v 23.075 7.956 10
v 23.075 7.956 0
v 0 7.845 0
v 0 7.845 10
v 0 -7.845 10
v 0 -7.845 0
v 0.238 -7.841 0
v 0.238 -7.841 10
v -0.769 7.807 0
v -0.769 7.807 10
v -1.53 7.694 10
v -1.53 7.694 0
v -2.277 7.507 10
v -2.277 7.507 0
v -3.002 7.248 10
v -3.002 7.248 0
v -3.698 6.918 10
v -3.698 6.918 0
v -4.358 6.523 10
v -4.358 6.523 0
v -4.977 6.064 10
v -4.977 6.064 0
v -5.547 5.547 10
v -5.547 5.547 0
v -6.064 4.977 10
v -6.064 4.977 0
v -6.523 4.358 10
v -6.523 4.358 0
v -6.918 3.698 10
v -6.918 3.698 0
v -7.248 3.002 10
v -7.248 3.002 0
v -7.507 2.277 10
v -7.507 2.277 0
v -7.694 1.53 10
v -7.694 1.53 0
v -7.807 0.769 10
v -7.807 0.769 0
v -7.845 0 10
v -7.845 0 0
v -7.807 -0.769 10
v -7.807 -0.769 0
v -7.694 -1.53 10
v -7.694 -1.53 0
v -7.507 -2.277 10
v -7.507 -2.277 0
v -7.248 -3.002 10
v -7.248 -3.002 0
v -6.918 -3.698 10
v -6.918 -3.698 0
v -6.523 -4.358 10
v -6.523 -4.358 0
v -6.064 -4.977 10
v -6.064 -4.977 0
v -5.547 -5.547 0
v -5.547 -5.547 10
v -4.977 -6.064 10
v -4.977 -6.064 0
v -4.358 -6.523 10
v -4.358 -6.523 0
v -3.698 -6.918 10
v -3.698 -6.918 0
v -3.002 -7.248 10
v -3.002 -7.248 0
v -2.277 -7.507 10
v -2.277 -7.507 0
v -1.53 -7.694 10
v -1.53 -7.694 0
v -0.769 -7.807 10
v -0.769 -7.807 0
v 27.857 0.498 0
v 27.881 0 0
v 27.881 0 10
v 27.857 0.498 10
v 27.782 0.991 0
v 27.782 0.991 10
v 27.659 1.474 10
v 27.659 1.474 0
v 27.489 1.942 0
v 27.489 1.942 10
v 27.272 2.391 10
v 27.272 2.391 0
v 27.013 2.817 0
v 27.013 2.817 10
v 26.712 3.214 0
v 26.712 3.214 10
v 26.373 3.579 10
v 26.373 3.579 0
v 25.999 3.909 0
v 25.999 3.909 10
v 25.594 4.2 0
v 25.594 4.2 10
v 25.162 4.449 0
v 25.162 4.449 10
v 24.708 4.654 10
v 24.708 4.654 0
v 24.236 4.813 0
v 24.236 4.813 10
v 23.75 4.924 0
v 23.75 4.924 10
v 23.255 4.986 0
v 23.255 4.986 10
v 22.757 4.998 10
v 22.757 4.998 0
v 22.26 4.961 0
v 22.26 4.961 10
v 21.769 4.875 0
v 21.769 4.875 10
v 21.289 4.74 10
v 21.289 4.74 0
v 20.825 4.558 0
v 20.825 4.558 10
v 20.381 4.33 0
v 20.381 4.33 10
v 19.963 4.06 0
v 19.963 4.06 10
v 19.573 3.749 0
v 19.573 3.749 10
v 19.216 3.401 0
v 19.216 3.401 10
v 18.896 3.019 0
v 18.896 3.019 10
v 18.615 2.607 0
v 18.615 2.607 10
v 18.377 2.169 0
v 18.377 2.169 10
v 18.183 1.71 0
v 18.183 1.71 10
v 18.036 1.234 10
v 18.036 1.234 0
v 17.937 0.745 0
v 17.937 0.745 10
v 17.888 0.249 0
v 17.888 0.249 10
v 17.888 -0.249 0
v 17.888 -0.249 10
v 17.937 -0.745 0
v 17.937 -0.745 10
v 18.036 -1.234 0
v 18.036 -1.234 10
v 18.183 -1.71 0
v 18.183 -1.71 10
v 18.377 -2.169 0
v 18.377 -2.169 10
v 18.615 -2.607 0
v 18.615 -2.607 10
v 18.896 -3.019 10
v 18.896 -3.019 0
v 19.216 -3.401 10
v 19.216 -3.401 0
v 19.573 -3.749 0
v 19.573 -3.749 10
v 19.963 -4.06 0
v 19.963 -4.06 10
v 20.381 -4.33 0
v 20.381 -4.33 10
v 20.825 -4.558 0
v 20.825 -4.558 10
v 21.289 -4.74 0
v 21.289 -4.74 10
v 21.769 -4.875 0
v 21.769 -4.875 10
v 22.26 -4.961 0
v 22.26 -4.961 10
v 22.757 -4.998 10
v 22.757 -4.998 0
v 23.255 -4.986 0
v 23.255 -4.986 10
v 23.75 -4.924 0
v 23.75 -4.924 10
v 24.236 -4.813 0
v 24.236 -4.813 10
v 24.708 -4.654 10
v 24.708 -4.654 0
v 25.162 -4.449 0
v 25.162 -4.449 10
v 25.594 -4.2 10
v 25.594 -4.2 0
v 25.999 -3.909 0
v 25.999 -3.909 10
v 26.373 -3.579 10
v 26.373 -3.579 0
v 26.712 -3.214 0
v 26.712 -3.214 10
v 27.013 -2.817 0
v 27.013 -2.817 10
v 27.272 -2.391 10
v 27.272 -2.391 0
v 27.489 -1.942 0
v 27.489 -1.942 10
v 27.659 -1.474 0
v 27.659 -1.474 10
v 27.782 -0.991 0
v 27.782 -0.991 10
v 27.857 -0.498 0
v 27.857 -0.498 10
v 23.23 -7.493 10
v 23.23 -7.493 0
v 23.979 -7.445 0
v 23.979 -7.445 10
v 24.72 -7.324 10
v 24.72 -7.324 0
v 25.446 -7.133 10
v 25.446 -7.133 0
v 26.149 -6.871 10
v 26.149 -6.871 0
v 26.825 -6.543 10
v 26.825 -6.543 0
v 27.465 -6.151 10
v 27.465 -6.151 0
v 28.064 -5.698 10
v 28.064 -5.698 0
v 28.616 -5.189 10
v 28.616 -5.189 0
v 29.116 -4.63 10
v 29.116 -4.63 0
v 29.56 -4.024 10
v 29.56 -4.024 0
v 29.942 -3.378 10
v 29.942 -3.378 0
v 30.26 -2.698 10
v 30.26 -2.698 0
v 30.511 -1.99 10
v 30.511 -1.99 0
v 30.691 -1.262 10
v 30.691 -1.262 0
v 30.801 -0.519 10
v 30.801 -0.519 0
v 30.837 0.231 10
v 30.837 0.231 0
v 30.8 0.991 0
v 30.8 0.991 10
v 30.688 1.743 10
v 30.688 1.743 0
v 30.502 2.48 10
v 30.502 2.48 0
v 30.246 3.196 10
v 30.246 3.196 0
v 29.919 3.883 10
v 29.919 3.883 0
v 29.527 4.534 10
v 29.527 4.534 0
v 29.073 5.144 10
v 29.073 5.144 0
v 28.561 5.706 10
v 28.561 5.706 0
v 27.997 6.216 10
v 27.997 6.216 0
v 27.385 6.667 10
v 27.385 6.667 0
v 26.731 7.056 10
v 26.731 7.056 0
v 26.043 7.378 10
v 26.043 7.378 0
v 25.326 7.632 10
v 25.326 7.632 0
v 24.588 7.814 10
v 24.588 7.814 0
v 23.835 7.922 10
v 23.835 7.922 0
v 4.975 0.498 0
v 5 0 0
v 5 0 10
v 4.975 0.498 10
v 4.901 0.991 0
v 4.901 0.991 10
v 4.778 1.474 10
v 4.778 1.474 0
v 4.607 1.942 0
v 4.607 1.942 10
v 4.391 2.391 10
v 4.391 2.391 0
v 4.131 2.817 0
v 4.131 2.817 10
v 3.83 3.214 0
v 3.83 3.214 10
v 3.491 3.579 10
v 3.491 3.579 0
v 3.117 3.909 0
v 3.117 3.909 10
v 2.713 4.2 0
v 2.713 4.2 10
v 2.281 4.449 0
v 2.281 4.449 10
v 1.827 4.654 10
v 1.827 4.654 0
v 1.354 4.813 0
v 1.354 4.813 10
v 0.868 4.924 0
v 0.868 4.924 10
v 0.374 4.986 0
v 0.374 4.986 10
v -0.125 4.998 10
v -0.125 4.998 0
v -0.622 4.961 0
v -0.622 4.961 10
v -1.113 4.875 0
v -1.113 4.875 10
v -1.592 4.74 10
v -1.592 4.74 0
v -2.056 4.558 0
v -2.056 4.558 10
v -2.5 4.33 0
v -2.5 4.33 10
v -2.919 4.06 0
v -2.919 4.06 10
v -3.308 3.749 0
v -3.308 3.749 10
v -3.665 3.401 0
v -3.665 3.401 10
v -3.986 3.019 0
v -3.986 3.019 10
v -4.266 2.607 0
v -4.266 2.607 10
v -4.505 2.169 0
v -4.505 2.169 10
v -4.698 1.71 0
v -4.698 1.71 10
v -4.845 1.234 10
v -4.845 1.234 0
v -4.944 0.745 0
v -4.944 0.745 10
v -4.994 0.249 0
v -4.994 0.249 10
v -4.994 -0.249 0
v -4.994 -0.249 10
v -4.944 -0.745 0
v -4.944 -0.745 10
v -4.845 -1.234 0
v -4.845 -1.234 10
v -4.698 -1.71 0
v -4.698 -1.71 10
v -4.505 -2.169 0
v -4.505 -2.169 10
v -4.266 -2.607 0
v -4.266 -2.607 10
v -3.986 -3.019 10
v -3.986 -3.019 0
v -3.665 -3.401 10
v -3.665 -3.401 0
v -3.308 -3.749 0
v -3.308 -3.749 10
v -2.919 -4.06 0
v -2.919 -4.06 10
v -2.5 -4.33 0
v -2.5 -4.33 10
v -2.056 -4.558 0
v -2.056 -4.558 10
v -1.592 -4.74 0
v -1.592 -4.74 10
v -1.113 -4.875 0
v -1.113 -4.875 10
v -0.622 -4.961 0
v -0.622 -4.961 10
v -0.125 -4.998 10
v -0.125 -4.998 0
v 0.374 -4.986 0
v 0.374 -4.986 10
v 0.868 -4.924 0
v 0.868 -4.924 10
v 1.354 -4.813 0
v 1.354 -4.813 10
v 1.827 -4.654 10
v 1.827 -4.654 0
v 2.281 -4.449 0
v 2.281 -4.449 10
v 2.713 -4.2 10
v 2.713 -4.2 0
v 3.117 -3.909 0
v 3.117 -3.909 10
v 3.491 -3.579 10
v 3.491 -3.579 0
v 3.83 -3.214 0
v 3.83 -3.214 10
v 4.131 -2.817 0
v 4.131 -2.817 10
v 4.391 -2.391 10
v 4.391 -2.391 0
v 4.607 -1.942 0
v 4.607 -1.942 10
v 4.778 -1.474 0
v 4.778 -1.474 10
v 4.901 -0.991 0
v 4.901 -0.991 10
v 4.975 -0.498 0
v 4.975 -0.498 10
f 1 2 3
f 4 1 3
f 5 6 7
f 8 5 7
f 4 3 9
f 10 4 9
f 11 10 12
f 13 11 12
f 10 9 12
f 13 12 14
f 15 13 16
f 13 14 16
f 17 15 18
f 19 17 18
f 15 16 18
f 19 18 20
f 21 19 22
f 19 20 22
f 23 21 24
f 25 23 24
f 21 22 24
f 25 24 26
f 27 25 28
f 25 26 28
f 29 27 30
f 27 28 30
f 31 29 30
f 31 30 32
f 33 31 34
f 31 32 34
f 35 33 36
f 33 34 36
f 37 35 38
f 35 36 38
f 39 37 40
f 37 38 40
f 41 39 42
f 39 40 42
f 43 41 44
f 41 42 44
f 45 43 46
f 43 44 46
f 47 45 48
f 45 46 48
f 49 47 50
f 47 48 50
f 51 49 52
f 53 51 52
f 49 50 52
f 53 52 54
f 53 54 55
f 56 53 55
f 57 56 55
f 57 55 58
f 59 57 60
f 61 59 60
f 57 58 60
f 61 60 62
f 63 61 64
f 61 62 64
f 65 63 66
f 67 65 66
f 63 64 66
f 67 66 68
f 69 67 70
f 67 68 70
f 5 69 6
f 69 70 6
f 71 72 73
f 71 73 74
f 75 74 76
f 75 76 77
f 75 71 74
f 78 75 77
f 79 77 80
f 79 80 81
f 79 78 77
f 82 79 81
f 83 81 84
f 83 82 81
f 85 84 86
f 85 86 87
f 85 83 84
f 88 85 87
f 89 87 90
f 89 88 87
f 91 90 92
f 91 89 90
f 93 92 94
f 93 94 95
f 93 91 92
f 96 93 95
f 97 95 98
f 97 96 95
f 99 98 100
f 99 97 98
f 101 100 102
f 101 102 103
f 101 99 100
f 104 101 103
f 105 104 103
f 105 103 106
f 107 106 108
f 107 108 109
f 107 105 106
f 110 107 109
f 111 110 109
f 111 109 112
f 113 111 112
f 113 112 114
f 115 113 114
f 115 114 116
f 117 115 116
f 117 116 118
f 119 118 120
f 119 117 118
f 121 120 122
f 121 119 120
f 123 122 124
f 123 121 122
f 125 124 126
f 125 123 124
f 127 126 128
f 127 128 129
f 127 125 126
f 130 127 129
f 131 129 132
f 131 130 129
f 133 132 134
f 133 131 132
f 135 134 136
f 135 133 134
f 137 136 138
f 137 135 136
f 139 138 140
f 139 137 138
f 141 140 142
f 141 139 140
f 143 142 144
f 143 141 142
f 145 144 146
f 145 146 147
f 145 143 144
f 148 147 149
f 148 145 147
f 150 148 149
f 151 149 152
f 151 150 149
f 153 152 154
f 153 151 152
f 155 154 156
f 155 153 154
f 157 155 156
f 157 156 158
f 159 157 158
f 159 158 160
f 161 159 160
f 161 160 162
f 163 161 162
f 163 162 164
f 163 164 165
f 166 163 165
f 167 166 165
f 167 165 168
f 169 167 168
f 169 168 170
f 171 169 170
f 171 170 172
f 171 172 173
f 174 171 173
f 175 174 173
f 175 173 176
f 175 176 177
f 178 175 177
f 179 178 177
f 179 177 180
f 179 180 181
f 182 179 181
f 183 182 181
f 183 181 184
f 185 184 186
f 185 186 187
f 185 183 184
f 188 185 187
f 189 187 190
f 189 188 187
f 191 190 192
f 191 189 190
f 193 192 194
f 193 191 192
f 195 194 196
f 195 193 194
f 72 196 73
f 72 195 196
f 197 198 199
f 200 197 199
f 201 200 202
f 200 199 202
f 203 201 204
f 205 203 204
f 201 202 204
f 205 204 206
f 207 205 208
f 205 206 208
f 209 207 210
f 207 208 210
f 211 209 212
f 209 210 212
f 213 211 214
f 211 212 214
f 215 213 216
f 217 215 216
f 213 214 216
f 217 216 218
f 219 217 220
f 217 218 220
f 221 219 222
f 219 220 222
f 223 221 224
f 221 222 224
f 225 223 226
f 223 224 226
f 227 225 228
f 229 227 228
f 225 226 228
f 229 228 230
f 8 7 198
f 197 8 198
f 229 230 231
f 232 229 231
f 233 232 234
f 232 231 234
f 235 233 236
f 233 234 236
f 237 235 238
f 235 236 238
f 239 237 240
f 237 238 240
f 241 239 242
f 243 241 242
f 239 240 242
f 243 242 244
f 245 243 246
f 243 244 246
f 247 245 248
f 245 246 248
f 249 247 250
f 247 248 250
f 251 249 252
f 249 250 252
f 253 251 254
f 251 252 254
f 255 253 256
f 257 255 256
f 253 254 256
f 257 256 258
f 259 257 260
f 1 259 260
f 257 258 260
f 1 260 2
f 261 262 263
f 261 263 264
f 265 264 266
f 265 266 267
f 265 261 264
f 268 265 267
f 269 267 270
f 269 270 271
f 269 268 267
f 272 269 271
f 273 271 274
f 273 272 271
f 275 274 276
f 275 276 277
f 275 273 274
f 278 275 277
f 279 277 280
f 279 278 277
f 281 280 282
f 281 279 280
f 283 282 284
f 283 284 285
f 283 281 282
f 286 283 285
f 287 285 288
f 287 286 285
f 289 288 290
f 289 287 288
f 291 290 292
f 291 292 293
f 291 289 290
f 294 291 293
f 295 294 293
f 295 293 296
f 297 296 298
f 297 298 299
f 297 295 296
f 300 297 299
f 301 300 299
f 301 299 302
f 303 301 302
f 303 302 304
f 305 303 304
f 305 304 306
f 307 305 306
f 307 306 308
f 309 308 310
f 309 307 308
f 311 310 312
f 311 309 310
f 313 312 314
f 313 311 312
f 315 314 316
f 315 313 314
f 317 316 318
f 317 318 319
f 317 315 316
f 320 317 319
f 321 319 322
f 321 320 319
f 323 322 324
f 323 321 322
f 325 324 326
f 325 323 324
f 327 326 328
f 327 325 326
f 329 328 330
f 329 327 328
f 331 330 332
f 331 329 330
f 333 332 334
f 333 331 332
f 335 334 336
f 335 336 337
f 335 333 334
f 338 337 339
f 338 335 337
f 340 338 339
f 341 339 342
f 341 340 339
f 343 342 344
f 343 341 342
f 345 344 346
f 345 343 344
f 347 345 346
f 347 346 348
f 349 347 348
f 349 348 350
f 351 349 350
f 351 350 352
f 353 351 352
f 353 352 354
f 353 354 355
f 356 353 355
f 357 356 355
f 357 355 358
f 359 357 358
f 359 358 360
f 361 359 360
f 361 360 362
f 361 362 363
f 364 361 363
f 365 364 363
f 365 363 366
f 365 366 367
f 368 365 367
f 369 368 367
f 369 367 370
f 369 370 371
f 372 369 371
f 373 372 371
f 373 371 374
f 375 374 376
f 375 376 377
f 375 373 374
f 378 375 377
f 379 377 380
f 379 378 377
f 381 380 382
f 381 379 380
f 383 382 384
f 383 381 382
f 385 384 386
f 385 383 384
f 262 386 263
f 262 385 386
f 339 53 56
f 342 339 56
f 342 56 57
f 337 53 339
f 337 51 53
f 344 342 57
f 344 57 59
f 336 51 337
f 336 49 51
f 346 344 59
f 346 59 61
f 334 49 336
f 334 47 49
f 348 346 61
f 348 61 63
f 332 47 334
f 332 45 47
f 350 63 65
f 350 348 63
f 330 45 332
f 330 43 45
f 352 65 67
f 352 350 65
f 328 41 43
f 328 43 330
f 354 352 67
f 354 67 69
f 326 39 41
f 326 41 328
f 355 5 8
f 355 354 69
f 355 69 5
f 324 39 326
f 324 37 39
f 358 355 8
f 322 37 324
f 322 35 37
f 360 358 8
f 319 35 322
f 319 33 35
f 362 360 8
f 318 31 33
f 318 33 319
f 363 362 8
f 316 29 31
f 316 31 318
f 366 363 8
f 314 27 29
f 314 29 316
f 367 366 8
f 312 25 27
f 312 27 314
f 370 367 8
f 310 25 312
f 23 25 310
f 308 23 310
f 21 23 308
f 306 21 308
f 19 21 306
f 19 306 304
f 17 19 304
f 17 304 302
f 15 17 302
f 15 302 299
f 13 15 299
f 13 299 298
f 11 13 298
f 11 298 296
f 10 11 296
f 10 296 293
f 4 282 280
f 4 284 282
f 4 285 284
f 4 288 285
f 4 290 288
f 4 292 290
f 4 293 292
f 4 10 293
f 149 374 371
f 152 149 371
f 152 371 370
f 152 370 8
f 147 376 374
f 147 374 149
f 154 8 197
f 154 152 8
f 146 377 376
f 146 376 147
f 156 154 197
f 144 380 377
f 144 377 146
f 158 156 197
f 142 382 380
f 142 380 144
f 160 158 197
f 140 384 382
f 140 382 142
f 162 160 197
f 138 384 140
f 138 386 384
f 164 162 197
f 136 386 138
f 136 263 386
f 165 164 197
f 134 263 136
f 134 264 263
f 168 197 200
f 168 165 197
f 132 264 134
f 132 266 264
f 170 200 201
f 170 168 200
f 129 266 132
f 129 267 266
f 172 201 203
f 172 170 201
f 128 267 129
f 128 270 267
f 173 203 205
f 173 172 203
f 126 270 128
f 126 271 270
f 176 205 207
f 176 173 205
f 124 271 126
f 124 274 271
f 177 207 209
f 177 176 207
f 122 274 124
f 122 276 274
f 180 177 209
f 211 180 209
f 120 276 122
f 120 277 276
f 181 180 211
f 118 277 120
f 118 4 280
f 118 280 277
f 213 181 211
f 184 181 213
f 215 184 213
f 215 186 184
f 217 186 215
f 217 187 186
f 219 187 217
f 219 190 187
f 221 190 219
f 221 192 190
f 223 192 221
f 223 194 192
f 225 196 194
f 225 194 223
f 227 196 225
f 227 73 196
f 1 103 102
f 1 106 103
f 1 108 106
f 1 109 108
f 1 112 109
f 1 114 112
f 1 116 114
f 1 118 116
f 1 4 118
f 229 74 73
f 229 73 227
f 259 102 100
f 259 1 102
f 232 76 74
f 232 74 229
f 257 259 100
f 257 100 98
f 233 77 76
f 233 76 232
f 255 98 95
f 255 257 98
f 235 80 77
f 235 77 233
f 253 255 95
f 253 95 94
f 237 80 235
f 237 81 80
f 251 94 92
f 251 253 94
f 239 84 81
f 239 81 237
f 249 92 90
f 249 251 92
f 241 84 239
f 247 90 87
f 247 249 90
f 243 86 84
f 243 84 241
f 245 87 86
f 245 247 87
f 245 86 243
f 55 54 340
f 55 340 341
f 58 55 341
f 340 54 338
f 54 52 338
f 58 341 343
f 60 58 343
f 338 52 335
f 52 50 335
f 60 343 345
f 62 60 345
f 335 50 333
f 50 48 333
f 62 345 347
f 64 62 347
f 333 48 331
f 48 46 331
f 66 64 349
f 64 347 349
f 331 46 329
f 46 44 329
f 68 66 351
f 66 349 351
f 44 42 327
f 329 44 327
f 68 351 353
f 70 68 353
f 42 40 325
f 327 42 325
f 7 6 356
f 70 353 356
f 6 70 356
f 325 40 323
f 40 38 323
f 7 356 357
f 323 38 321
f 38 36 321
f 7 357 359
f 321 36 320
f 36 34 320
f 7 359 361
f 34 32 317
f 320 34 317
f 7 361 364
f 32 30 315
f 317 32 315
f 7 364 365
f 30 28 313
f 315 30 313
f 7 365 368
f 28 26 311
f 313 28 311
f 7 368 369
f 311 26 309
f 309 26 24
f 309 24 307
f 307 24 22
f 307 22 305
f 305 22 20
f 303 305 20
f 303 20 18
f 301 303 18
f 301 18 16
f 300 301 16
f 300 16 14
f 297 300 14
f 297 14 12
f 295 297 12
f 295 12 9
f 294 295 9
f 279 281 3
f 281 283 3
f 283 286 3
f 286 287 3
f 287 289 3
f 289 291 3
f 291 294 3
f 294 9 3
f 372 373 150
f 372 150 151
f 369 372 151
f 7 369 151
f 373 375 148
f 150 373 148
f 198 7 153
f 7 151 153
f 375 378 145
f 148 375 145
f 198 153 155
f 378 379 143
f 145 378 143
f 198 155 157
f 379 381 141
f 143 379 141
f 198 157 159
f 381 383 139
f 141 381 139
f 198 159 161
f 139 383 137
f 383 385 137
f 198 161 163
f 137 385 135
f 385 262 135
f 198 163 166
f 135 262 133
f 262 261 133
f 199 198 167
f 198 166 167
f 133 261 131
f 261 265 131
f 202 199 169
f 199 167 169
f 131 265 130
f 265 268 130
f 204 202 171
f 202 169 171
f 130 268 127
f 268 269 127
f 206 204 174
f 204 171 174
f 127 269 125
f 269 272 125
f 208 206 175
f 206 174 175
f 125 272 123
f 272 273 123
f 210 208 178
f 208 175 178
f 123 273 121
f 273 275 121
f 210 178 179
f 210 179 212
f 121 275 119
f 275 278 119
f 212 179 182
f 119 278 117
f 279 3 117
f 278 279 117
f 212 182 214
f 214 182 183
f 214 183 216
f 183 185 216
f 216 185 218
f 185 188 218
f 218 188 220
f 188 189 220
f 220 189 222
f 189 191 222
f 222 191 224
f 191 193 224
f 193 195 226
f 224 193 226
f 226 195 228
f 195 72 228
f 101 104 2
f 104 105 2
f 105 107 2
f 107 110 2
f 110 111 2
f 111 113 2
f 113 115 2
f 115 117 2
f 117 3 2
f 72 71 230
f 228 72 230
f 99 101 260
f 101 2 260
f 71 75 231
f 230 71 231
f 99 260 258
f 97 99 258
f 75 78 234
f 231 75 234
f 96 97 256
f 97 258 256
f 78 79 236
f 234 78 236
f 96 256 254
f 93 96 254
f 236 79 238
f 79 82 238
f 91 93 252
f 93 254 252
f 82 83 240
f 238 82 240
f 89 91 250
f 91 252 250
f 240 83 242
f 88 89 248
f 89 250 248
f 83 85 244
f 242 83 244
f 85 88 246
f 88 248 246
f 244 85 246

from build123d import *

# Parameters (mm, degrees)
F0_R     = 5
F1_DEPTH = 10


with BuildPart() as f1:
    # F0 (on Top) → F1 (new body)
    with BuildSketch(Plane.XY):
        with BuildLine():
            ThreePointArc((0.237756, -7.841041), (5.630434, -5.462296), (7.844645, 0))
            ThreePointArc((7.844645, 0), (5.547002, 5.547002), (0, 7.844645))
            ThreePointArc((0, 7.844645), (-7.844645, 0), (0, -7.844645))
            Line((0, -7.844645), (0.237756, -7.841041))
        make_face()
        Circle(F0_R, mode=Mode.SUBTRACT)
        with BuildLine():
            ThreePointArc((0, 7.844645), (5.547002, 5.547002), (7.844645, 0))
            ThreePointArc((7.844645, 0), (5.630434, -5.462296), (0.237756, -7.841041))
            Line((0.237756, -7.841041), (23.229579, -7.492543))
            ThreePointArc((23.229579, -7.492543), (15.388337, 0.154019), (23.075368, 7.955591))
            Line((23.075368, 7.955591), (0, 7.844645))
        make_face()
        with BuildLine():
            ThreePointArc((30.837062, 0.231125), (28.561446, 5.706325), (23.075368, 7.955591))
            ThreePointArc((23.075368, 7.955591), (15.388337, 0.154019), (23.229579, -7.492543))
            ThreePointArc((23.229579, -7.492543), (28.615828, -5.189411), (30.837062, 0.231125))
        make_face()
        with Locations((22.88138, 0)):
            Circle(F0_R, mode=Mode.SUBTRACT)
    extrude(amount=F1_DEPTH)


solid = f1.part
